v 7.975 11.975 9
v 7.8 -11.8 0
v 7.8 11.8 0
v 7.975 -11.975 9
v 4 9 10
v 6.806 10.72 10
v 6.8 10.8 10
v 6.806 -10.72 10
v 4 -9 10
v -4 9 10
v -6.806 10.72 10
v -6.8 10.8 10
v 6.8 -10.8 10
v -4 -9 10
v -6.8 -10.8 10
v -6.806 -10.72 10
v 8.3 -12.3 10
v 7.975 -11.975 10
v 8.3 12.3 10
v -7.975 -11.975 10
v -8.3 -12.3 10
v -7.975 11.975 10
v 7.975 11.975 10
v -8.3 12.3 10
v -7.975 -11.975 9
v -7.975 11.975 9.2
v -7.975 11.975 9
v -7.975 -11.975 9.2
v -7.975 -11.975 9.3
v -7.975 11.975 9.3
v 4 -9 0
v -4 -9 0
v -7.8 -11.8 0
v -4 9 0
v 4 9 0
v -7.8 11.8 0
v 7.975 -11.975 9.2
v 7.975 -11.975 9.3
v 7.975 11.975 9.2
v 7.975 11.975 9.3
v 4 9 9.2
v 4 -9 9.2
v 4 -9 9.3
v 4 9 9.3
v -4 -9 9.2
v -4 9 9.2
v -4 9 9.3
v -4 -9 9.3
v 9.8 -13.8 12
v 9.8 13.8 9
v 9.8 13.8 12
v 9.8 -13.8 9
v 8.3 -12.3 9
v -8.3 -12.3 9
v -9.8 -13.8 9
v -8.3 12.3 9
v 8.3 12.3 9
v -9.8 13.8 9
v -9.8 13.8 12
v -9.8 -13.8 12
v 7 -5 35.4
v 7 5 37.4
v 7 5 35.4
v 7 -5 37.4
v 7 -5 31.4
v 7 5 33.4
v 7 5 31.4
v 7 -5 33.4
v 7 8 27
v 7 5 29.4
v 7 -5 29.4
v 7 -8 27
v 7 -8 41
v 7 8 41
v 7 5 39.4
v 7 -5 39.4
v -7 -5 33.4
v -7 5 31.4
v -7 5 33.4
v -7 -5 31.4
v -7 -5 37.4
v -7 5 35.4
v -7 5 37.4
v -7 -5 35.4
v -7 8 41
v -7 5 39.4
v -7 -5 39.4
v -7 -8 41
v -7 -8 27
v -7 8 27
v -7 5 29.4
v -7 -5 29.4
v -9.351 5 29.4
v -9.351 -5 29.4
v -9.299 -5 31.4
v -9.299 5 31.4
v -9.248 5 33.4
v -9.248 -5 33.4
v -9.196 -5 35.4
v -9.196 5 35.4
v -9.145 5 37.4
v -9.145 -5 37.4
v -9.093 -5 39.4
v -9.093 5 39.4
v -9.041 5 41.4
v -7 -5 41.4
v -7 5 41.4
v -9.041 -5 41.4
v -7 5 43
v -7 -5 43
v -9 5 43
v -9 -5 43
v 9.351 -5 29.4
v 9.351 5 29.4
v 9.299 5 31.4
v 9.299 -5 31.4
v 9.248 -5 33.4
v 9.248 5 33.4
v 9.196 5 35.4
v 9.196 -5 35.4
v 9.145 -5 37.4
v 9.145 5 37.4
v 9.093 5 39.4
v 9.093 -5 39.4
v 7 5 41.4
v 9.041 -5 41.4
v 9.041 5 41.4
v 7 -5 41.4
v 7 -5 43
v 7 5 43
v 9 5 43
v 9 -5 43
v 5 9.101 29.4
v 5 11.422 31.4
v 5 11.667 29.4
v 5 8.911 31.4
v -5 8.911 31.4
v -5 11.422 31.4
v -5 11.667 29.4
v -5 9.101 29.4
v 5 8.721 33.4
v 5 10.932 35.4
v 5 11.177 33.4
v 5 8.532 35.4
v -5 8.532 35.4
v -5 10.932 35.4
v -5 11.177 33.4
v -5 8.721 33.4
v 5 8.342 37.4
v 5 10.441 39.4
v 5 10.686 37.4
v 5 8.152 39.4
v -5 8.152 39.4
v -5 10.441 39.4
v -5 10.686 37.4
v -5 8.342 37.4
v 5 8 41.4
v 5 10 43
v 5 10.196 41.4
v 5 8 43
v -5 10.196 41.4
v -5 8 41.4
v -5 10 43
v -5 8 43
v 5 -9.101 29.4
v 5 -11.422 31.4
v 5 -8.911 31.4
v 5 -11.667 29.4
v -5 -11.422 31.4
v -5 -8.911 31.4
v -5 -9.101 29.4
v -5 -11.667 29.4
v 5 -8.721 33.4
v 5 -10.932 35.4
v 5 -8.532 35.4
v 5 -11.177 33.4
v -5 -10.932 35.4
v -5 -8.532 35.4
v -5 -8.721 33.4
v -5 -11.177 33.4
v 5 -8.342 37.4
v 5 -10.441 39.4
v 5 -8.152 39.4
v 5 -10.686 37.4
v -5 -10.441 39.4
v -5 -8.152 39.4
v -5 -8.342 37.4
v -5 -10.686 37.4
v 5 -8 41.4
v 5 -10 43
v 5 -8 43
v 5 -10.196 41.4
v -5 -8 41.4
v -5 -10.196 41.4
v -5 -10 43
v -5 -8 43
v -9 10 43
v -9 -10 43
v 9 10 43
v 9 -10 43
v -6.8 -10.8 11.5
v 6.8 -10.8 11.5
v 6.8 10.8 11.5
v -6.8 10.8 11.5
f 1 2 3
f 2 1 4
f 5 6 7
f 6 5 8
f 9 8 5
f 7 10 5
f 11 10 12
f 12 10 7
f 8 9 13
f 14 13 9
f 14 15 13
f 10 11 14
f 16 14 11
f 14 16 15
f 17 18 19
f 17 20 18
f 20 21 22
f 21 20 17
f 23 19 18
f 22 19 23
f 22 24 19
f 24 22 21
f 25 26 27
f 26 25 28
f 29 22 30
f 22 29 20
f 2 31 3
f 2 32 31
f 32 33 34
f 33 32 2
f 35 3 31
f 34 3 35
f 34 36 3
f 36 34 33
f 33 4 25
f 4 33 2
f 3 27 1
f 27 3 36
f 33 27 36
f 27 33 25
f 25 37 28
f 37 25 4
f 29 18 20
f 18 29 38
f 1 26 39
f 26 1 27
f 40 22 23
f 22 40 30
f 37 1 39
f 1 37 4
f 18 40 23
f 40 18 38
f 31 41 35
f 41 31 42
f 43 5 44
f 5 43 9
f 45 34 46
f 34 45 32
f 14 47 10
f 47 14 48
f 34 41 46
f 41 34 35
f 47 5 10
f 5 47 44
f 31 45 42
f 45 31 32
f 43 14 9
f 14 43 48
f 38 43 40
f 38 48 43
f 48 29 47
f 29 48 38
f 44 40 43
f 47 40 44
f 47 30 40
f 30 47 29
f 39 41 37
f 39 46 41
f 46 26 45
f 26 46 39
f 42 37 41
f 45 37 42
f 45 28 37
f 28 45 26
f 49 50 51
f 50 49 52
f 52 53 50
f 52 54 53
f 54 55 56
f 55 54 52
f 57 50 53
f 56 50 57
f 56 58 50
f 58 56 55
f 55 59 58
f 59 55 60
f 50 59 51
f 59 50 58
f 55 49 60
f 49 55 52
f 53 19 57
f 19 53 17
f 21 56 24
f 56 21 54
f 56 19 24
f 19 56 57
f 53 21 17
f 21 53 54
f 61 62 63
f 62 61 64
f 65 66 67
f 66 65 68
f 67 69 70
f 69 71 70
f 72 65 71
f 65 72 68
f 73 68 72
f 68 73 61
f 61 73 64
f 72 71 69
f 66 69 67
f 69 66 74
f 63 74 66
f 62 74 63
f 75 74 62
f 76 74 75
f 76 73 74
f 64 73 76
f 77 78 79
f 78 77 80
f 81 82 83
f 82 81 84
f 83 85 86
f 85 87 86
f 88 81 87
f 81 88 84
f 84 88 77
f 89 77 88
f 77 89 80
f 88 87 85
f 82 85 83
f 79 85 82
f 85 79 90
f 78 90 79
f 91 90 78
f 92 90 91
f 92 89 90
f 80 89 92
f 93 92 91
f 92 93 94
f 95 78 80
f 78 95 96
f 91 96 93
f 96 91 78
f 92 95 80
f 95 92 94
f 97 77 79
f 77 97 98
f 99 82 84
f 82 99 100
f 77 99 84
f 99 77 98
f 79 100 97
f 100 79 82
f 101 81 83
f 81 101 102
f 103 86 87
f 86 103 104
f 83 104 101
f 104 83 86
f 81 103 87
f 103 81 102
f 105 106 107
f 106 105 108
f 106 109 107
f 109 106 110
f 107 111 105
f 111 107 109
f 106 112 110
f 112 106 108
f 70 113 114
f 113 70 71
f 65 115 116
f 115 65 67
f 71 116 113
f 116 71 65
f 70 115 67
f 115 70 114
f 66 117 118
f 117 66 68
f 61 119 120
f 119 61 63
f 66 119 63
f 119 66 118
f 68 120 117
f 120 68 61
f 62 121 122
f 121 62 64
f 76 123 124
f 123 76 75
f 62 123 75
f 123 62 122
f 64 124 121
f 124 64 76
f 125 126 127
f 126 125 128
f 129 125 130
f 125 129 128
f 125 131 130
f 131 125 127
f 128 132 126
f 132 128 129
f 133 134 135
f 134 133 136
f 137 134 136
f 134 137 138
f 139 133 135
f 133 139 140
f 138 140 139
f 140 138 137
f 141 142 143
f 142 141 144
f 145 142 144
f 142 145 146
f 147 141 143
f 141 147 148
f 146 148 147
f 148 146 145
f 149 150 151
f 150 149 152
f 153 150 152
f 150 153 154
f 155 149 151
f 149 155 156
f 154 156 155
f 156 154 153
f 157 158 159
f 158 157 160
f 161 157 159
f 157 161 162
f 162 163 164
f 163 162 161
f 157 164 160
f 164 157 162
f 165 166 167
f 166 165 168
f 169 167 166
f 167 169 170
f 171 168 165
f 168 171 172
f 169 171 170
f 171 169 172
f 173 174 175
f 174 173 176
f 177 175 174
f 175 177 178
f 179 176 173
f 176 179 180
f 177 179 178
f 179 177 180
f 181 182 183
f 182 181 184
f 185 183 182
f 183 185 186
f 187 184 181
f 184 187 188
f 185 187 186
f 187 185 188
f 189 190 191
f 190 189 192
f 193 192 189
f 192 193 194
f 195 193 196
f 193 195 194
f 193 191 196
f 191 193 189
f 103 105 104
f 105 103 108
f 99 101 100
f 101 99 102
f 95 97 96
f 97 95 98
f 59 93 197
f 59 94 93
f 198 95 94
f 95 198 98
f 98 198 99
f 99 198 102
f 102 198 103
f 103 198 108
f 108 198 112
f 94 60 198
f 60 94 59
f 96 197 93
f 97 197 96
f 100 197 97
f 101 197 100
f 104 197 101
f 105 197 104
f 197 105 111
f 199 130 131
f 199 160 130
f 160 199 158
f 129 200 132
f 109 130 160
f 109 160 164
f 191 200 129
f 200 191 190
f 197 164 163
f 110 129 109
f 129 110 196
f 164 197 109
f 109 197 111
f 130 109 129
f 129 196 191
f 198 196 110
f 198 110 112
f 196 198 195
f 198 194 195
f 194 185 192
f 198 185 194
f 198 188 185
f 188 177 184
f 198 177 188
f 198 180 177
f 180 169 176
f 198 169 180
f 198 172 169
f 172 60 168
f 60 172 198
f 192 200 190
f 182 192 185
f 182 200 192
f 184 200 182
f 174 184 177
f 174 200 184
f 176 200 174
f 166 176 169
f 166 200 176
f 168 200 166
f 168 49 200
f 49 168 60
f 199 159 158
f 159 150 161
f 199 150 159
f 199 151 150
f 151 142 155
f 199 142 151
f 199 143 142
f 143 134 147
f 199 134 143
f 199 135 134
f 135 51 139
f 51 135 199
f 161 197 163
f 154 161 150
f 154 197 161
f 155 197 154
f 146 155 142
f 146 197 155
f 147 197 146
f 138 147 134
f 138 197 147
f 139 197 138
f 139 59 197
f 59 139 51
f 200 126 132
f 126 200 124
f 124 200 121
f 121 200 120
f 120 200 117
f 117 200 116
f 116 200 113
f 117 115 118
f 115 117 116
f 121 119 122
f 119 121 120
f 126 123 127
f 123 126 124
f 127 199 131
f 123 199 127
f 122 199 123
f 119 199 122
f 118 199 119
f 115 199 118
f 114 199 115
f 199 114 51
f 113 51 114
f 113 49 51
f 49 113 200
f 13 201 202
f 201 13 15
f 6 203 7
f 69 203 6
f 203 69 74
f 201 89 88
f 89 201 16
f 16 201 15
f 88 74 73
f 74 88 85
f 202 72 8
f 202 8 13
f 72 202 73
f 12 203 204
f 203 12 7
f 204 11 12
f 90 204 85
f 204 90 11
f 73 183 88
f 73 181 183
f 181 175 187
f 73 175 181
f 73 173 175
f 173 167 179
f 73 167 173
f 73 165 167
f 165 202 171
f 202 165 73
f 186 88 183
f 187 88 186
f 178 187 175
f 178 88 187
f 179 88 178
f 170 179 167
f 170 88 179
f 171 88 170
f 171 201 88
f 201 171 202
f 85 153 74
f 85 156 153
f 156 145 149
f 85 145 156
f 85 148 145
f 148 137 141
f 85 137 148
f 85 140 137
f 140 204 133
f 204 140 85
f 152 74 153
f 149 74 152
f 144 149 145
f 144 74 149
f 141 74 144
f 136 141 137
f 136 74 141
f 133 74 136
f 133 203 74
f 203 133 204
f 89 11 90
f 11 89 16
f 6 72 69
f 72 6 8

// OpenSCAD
// file: sleds.scad
// ==========================================
// Xentient Framework - Universal Sled & Socket Library
// Shared modules for all peripheral caps
// ==========================================
// Per Framework §2: Universal Mating Protocol
// Female Socket (in hub): 24.0×16.0×10.0mm, wire channel 18×8mm
// Male Sled (on cap base): 23.6×15.6×10.0mm, 1° draft, hollow 18×8mm
// Units: mm

$fn = 64;

// ==========================================
// MALE SLED PARAMETERS
// ==========================================

Sled_W       = 23.6;    // Width (0.4mm tolerance in female 24.0mm)
Sled_H       = 15.6;    // Height (0.4mm tolerance in female 16.0mm)
Sled_D       = 10.0;    // Depth (insertion length)
Sled_Draft   = 1.0;     // 1-degree draft angle
Sled_Wire_W  = 18.0;    // Wire pass-through width
Sled_Wire_H  = 8.0;     // Wire pass-through height
Sled_Wall    = 2.0;     // Minimum wall thickness

// Derived
Sled_Draft_Off = Sled_D * tan(Sled_Draft);  // ~0.17mm per side

// ==========================================
// MODULE: male_sled()
// The plug base that inserts into the hub's female socket.
// All caps start with this at their base.
//
// Usage: difference() { male_sled(); /* your cap-specific cutouts */ }
// ==========================================

module male_sled() {
    difference() {
        // Outer body with 1° draft
        hull() {
            // Entry face (slightly larger for wedge fit)
            translate([0, 0, Sled_D - 0.5])
                cube([Sled_H + 2*Sled_Draft_Off,
                      Sled_W + 2*Sled_Draft_Off,
                      1], center=true);
            // Inner face (exact size)
            translate([0, 0, 0.5])
                cube([Sled_H, Sled_W, 1], center=true);
        }

        // Wire pass-through (hollow core)
        translate([0, 0, Sled_D / 2])
            cube([Sled_Wire_H, Sled_Wire_W, Sled_D + 2], center=true);

        // Entry chamfer (45° for easy insertion)
        chamfer_h = 1.5;
        translate([0, 0, Sled_D - chamfer_h/2])
            hull() {
                cube([Sled_H + 2*chamfer_h, Sled_W + 2*chamfer_h, 0.1], center=true);
                cube([Sled_H, Sled_W, 0.1], center=true);
            }
    }
}

// ==========================================
// MODULE: male_sled_with_flange()
// Adds a flange around the sled base for cap-to-hub transition.
// Flange sits flush against hub exterior face.
//
// flange_w: extra width beyond sled on each side
// flange_h: extra height beyond sled on each side
// flange_t: flange thickness
// ==========================================

module male_sled_with_flange(flange_w=2.0, flange_h=2.0, flange_t=2.0) {
    union() {
        male_sled();

        // Flange ring around sled entry
        translate([0, 0, Sled_D])
            difference() {
                cube([Sled_H + 2*flange_h,
                      Sled_W + 2*flange_w,
                      flange_t], center=true);
                // Cut sled opening through flange
                cube([Sled_H + 1, Sled_W + 1, flange_t + 2], center=true);
            }
    }
}

// ==========================================
// MODULE: wire_channel()
// Internal wire routing channel from sled to component.
// Extends from sled core outward through the cap body.
//
// length: distance from sled to component
// direction: "straight" or "angled"
// ==========================================

module wire_channel(length=15, direction="straight") {
    if (direction == "straight") {
        translate([0, 0, Sled_D / 2 + length / 2])
            cube([Sled_Wire_H, Sled_Wire_W, length + 1], center=true);
    }
}

// ==========================================
// VISUALIZATION HELPERS
// ==========================================

// Render just the sled for testing
// male_sled();
// main file
// ==========================================
// Xentient Framework - Housing 3: Climate (BME280)
// Standoff vented box with 15mm extension from hub
// ==========================================
// Component: BME280 breakout (13×10mm) + 100nF cap
// Connection: 6-pin JST XH pigtail (I2C: VCC, GND, SDA, SCL, NC, NC)
//              4 active pins, 2 unused/NC
// Socket: 150° face (away from heat sources)
// Per Framework §4 Housing 3
// CRITICAL: Must extend 15mm+ from hub to avoid reading hub's own heat
// Units: mm

include <sleds.scad>;

$fn = 64;

// ==========================================
// COMPONENT DIMENSIONS
// ==========================================

BME_W    = 13.0;    // BME280 board width
BME_H    = 10.0;    // BME280 board height
BME_T    = 1.6;     // PCB thickness
BME_Clear = 0.4;    // Clearance per side

// Housing dimensions
Ext_Length = 15.0;  // Minimum extension from hub face (CRITICAL)
Box_W      = 20.0;  // Housing width (sled 24mm → 20mm at sensor end)
Box_H      = 18.0;  // Housing height
Box_D      = 18.0;  // Housing depth (extension length)
House_Wall = 2.0;   // Wall thickness
Vent_N     = 4;     // Louver slits per side
Vent_W     = 2.0;   // Slit width
Vent_L     = 10.0;  // Slit length
Vent_Spc   = 4.0;   // Slit spacing
PCB_Shelf_H = 3.0;  // Shelf height for BME board

// ==========================================
// MODULE: housing_climate()
// ==========================================

module housing_climate() {
    union() {
        // Sled base with flange
        male_sled_with_flange(flange_w=2.0, flange_h=2.0, flange_t=2.0);

        // Transition + extended box
        translate([0, 0, Sled_D]) {
            difference() {
                // Outer shell: sled face → standoff box
                hull() {
                    // Transition from sled face
                    translate([0, 0, 1])
                        cube([Sled_H + 4, Sled_W + 4, 2], center=true);
                    // Extended box at sensor end
                    translate([0, 0, Ext_Length + Box_D / 2])
                        cube([Box_H, Box_W, Box_D], center=true);
                }

                // Inner cavity
                hull() {
                    translate([0, 0, 0.5])
                        cube([Sled_H - 2, Sled_W - 2, 2], center=true);
                    translate([0, 0, Ext_Length + Box_D / 2])
                        cube([Box_H - 2*House_Wall, Box_W - 2*House_Wall, Box_D - 2*House_Wall], center=true);
                }

                // BME280 mount shelf (at sensor end)
                translate([0, 0, Ext_Length + Box_D * 0.7])
                    difference() {
                        cube([Box_H - 2*House_Wall, Box_W - 2*House_Wall, PCB_Shelf_H], center=true);
                        // Cutout for BME board (sits on shelf)
                        translate([0, 0, PCB_Shelf_H/2])
                            cube([BME_W + BME_Clear, BME_H + BME_Clear, PCB_Shelf_H], center=true);
                    }

                // Wire channel through transition
                translate([0, 0, -2])
                    cube([Sled_Wire_H, Sled_Wire_W, Ext_Length + Box_D + 6], center=true);

                // ===== LOUVERED VENTILATION SLITS =====
                // Left side gills
                for (i = [0 : Vent_N - 1]) {
                    vz = Ext_Length + Box_D * 0.3 + i * Vent_Spc;
                    translate([-Box_H/2 - 1, 0, vz])
                        rotate([0, 90, 0])
                            cube([Vent_W, Vent_L, House_Wall + 4], center=true);
                }
                // Right side gills
                for (i = [0 : Vent_N - 1]) {
                    vz = Ext_Length + Box_D * 0.3 + i * Vent_Spc;
                    translate([Box_H/2 + 1, 0, vz])
                        rotate([0, 90, 0])
                            cube([Vent_W, Vent_L, House_Wall + 4], center=true);
                }
                // Top gills
                for (i = [0 : Vent_N - 1]) {
                    vz = Ext_Length + Box_D * 0.3 + i * Vent_Spc;
                    translate([0, Box_W/2 + 1, vz])
                        cube([Vent_L, House_Wall + 4, Vent_W], center=true);
                }
                // Bottom gills
                for (i = [0 : Vent_N - 1]) {
                    vz = Ext_Length + Box_D * 0.3 + i * Vent_Spc;
                    translate([0, -Box_W/2 - 1, vz])
                        cube([Vent_L, House_Wall + 4, Vent_W], center=true);
                }
            }
        }
    }
}

// ==========================================
// RENDER
// ==========================================

housing_climate();
